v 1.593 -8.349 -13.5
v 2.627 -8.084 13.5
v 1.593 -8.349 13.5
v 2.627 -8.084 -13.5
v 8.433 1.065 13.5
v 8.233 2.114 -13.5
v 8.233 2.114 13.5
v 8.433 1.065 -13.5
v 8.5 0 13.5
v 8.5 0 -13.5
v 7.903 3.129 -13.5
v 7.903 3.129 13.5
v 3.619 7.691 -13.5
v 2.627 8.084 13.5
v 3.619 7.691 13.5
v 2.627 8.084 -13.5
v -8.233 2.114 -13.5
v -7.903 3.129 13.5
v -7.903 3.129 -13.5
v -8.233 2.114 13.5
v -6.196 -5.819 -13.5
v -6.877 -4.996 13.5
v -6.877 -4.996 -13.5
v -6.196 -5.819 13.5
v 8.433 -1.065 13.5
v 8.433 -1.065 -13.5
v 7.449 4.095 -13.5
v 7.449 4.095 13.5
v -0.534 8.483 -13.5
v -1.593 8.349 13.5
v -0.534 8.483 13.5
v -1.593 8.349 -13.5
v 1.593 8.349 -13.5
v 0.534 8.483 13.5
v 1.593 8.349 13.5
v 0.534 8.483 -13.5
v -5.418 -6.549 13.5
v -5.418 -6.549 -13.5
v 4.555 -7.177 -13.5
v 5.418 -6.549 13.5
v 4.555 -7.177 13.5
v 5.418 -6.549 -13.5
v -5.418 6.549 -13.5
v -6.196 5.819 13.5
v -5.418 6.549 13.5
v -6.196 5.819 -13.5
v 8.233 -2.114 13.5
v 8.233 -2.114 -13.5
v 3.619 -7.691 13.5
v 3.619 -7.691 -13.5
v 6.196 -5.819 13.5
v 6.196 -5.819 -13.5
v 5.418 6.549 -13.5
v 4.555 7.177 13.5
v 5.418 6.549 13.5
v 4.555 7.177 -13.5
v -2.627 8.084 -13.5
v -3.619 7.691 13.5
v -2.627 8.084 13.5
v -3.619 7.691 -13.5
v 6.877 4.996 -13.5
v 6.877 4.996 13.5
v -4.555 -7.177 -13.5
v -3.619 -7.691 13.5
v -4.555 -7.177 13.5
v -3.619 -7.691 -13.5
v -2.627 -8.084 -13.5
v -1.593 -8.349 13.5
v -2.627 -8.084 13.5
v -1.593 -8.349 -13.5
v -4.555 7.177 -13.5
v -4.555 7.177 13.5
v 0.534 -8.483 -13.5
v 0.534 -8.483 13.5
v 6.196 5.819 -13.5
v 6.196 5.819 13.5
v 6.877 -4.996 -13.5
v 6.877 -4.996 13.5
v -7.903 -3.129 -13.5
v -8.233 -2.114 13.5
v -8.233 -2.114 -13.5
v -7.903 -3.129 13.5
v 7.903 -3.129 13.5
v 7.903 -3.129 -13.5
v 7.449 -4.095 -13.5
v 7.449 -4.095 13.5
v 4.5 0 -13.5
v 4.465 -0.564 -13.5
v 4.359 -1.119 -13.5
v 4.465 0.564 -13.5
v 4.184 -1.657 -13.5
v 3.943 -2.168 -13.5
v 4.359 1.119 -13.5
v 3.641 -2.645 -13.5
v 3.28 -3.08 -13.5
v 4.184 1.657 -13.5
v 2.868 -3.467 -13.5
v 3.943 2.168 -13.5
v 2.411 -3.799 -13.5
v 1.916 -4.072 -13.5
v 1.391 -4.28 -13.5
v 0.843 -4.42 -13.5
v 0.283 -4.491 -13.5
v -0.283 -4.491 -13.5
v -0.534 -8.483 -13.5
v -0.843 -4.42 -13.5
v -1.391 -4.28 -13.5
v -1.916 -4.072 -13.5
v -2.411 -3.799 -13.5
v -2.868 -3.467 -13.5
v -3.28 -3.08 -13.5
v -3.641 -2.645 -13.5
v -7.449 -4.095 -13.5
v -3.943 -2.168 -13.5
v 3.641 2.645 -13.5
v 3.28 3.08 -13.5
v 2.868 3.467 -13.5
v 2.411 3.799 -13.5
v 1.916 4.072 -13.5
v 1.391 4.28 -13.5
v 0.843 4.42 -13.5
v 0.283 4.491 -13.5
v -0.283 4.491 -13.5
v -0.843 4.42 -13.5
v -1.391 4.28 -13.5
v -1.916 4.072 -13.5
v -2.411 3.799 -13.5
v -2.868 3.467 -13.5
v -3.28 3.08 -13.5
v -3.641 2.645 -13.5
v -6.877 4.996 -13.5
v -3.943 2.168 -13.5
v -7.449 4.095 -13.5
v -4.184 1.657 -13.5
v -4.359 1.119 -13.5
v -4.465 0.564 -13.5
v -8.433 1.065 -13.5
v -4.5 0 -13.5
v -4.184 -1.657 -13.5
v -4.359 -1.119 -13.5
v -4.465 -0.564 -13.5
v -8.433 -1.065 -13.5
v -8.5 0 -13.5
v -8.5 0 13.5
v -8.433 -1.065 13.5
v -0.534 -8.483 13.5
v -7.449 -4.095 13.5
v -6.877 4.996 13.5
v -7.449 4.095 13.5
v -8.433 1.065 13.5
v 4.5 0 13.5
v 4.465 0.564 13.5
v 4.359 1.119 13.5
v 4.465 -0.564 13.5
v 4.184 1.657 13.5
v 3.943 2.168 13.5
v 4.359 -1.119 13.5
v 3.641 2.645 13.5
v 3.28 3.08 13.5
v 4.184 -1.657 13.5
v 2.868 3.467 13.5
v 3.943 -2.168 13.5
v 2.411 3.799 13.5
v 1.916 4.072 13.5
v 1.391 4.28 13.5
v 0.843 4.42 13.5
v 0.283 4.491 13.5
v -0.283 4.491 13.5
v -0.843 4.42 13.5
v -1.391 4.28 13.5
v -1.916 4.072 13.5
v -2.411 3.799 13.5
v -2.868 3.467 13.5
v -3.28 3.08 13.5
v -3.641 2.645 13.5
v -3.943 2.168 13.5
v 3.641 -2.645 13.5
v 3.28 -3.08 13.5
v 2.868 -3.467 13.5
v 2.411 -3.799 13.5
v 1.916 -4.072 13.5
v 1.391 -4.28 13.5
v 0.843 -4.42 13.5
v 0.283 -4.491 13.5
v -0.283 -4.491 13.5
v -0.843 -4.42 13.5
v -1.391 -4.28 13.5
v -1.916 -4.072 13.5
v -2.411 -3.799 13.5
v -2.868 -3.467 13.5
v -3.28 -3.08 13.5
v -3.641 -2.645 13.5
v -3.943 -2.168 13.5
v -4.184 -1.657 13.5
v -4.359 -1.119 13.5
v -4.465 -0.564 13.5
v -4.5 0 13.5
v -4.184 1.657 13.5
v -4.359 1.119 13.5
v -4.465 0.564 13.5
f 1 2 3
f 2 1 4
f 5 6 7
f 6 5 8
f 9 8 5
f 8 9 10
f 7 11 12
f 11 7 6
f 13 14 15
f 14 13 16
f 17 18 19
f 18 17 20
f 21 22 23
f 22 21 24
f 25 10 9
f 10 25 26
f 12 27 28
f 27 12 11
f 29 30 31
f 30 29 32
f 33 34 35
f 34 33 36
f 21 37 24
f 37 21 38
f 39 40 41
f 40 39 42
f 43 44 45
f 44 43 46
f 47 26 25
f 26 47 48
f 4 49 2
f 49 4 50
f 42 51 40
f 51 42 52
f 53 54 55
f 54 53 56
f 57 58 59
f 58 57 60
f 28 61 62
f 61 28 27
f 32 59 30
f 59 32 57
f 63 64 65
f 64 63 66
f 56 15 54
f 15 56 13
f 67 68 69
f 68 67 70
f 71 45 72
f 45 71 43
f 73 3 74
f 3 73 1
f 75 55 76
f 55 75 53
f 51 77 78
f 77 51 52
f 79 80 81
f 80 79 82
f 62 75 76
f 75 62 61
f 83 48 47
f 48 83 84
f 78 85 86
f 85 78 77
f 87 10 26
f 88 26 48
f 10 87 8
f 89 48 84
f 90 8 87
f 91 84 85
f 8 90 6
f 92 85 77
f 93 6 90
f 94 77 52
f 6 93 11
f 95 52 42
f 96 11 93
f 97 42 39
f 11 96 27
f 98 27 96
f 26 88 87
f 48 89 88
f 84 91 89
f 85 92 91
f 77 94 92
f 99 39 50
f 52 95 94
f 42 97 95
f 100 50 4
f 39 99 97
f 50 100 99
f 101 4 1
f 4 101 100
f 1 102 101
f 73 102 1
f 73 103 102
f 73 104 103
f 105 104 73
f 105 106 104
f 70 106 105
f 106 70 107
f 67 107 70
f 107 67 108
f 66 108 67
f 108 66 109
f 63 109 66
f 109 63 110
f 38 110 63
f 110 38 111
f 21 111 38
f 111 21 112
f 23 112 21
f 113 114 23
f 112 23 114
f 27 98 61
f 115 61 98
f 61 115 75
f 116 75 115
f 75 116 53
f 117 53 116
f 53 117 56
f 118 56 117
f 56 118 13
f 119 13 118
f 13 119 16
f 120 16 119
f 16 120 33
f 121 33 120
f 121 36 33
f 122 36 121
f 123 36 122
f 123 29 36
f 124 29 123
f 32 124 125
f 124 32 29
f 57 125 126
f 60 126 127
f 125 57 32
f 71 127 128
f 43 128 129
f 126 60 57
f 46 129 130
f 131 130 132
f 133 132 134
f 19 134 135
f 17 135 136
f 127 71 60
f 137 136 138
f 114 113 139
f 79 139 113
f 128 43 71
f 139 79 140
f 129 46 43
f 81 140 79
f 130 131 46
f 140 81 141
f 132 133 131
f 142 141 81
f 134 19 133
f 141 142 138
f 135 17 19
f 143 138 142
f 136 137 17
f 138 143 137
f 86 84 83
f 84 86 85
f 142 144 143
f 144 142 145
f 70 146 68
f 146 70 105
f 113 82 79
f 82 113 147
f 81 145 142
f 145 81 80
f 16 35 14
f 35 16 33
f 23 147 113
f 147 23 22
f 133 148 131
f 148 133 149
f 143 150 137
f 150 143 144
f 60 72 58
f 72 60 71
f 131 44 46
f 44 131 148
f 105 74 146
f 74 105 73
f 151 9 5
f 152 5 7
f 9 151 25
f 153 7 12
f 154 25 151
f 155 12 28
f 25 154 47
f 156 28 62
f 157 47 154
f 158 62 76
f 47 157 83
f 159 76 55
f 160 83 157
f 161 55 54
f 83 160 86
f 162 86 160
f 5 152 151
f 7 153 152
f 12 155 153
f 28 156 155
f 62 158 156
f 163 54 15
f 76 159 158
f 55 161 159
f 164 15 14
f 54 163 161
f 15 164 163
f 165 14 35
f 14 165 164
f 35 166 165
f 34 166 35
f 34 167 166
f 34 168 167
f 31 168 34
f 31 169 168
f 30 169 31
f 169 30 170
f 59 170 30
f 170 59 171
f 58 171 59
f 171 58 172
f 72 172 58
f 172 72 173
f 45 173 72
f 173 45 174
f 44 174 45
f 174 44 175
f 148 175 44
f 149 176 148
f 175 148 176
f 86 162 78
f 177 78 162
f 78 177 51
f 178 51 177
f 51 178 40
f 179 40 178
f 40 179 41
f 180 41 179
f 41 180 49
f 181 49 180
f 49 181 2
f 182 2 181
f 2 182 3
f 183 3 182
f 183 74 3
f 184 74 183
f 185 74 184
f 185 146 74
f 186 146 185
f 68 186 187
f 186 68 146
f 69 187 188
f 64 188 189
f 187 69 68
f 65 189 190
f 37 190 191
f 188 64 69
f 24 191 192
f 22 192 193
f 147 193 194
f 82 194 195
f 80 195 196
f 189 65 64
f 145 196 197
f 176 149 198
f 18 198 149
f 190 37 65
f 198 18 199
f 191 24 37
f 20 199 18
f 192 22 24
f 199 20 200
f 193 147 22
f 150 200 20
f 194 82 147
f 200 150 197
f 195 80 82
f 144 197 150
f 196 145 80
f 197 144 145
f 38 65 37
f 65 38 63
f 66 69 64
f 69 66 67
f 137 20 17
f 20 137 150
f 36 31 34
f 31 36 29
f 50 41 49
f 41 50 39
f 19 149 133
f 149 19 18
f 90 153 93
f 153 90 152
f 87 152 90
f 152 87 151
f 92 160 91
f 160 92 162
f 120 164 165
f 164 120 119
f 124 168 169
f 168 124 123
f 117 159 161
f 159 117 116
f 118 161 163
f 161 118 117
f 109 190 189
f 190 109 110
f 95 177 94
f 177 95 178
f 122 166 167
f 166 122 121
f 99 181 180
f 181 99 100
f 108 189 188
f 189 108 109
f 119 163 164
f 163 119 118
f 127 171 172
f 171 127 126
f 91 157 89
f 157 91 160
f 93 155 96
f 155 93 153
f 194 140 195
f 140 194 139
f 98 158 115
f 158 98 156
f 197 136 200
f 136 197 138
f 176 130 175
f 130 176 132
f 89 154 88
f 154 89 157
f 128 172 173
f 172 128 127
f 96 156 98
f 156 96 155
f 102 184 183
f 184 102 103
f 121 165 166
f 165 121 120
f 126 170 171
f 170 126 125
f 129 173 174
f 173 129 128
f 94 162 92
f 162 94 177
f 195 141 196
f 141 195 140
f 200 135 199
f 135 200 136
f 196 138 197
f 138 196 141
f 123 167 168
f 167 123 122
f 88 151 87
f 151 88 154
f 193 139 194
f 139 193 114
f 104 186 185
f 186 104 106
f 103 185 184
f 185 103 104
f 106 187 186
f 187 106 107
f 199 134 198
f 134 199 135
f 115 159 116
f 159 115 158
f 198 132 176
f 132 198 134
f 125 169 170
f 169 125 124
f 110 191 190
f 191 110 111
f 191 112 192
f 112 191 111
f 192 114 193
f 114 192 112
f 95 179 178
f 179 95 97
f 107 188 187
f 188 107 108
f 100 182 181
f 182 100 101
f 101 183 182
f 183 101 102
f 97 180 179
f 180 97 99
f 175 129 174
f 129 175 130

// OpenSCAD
$fn = 50;


difference() {
	union() {
		translate(v = [0, 0, -13.5000000000]) {
			cylinder(h = 27, r = 8.5000000000);
		}
	}
	union() {
		translate(v = [0, 0, -100.0000000000]) {
			cylinder(h = 200, r = 4.5000000000);
		}
	}
}
